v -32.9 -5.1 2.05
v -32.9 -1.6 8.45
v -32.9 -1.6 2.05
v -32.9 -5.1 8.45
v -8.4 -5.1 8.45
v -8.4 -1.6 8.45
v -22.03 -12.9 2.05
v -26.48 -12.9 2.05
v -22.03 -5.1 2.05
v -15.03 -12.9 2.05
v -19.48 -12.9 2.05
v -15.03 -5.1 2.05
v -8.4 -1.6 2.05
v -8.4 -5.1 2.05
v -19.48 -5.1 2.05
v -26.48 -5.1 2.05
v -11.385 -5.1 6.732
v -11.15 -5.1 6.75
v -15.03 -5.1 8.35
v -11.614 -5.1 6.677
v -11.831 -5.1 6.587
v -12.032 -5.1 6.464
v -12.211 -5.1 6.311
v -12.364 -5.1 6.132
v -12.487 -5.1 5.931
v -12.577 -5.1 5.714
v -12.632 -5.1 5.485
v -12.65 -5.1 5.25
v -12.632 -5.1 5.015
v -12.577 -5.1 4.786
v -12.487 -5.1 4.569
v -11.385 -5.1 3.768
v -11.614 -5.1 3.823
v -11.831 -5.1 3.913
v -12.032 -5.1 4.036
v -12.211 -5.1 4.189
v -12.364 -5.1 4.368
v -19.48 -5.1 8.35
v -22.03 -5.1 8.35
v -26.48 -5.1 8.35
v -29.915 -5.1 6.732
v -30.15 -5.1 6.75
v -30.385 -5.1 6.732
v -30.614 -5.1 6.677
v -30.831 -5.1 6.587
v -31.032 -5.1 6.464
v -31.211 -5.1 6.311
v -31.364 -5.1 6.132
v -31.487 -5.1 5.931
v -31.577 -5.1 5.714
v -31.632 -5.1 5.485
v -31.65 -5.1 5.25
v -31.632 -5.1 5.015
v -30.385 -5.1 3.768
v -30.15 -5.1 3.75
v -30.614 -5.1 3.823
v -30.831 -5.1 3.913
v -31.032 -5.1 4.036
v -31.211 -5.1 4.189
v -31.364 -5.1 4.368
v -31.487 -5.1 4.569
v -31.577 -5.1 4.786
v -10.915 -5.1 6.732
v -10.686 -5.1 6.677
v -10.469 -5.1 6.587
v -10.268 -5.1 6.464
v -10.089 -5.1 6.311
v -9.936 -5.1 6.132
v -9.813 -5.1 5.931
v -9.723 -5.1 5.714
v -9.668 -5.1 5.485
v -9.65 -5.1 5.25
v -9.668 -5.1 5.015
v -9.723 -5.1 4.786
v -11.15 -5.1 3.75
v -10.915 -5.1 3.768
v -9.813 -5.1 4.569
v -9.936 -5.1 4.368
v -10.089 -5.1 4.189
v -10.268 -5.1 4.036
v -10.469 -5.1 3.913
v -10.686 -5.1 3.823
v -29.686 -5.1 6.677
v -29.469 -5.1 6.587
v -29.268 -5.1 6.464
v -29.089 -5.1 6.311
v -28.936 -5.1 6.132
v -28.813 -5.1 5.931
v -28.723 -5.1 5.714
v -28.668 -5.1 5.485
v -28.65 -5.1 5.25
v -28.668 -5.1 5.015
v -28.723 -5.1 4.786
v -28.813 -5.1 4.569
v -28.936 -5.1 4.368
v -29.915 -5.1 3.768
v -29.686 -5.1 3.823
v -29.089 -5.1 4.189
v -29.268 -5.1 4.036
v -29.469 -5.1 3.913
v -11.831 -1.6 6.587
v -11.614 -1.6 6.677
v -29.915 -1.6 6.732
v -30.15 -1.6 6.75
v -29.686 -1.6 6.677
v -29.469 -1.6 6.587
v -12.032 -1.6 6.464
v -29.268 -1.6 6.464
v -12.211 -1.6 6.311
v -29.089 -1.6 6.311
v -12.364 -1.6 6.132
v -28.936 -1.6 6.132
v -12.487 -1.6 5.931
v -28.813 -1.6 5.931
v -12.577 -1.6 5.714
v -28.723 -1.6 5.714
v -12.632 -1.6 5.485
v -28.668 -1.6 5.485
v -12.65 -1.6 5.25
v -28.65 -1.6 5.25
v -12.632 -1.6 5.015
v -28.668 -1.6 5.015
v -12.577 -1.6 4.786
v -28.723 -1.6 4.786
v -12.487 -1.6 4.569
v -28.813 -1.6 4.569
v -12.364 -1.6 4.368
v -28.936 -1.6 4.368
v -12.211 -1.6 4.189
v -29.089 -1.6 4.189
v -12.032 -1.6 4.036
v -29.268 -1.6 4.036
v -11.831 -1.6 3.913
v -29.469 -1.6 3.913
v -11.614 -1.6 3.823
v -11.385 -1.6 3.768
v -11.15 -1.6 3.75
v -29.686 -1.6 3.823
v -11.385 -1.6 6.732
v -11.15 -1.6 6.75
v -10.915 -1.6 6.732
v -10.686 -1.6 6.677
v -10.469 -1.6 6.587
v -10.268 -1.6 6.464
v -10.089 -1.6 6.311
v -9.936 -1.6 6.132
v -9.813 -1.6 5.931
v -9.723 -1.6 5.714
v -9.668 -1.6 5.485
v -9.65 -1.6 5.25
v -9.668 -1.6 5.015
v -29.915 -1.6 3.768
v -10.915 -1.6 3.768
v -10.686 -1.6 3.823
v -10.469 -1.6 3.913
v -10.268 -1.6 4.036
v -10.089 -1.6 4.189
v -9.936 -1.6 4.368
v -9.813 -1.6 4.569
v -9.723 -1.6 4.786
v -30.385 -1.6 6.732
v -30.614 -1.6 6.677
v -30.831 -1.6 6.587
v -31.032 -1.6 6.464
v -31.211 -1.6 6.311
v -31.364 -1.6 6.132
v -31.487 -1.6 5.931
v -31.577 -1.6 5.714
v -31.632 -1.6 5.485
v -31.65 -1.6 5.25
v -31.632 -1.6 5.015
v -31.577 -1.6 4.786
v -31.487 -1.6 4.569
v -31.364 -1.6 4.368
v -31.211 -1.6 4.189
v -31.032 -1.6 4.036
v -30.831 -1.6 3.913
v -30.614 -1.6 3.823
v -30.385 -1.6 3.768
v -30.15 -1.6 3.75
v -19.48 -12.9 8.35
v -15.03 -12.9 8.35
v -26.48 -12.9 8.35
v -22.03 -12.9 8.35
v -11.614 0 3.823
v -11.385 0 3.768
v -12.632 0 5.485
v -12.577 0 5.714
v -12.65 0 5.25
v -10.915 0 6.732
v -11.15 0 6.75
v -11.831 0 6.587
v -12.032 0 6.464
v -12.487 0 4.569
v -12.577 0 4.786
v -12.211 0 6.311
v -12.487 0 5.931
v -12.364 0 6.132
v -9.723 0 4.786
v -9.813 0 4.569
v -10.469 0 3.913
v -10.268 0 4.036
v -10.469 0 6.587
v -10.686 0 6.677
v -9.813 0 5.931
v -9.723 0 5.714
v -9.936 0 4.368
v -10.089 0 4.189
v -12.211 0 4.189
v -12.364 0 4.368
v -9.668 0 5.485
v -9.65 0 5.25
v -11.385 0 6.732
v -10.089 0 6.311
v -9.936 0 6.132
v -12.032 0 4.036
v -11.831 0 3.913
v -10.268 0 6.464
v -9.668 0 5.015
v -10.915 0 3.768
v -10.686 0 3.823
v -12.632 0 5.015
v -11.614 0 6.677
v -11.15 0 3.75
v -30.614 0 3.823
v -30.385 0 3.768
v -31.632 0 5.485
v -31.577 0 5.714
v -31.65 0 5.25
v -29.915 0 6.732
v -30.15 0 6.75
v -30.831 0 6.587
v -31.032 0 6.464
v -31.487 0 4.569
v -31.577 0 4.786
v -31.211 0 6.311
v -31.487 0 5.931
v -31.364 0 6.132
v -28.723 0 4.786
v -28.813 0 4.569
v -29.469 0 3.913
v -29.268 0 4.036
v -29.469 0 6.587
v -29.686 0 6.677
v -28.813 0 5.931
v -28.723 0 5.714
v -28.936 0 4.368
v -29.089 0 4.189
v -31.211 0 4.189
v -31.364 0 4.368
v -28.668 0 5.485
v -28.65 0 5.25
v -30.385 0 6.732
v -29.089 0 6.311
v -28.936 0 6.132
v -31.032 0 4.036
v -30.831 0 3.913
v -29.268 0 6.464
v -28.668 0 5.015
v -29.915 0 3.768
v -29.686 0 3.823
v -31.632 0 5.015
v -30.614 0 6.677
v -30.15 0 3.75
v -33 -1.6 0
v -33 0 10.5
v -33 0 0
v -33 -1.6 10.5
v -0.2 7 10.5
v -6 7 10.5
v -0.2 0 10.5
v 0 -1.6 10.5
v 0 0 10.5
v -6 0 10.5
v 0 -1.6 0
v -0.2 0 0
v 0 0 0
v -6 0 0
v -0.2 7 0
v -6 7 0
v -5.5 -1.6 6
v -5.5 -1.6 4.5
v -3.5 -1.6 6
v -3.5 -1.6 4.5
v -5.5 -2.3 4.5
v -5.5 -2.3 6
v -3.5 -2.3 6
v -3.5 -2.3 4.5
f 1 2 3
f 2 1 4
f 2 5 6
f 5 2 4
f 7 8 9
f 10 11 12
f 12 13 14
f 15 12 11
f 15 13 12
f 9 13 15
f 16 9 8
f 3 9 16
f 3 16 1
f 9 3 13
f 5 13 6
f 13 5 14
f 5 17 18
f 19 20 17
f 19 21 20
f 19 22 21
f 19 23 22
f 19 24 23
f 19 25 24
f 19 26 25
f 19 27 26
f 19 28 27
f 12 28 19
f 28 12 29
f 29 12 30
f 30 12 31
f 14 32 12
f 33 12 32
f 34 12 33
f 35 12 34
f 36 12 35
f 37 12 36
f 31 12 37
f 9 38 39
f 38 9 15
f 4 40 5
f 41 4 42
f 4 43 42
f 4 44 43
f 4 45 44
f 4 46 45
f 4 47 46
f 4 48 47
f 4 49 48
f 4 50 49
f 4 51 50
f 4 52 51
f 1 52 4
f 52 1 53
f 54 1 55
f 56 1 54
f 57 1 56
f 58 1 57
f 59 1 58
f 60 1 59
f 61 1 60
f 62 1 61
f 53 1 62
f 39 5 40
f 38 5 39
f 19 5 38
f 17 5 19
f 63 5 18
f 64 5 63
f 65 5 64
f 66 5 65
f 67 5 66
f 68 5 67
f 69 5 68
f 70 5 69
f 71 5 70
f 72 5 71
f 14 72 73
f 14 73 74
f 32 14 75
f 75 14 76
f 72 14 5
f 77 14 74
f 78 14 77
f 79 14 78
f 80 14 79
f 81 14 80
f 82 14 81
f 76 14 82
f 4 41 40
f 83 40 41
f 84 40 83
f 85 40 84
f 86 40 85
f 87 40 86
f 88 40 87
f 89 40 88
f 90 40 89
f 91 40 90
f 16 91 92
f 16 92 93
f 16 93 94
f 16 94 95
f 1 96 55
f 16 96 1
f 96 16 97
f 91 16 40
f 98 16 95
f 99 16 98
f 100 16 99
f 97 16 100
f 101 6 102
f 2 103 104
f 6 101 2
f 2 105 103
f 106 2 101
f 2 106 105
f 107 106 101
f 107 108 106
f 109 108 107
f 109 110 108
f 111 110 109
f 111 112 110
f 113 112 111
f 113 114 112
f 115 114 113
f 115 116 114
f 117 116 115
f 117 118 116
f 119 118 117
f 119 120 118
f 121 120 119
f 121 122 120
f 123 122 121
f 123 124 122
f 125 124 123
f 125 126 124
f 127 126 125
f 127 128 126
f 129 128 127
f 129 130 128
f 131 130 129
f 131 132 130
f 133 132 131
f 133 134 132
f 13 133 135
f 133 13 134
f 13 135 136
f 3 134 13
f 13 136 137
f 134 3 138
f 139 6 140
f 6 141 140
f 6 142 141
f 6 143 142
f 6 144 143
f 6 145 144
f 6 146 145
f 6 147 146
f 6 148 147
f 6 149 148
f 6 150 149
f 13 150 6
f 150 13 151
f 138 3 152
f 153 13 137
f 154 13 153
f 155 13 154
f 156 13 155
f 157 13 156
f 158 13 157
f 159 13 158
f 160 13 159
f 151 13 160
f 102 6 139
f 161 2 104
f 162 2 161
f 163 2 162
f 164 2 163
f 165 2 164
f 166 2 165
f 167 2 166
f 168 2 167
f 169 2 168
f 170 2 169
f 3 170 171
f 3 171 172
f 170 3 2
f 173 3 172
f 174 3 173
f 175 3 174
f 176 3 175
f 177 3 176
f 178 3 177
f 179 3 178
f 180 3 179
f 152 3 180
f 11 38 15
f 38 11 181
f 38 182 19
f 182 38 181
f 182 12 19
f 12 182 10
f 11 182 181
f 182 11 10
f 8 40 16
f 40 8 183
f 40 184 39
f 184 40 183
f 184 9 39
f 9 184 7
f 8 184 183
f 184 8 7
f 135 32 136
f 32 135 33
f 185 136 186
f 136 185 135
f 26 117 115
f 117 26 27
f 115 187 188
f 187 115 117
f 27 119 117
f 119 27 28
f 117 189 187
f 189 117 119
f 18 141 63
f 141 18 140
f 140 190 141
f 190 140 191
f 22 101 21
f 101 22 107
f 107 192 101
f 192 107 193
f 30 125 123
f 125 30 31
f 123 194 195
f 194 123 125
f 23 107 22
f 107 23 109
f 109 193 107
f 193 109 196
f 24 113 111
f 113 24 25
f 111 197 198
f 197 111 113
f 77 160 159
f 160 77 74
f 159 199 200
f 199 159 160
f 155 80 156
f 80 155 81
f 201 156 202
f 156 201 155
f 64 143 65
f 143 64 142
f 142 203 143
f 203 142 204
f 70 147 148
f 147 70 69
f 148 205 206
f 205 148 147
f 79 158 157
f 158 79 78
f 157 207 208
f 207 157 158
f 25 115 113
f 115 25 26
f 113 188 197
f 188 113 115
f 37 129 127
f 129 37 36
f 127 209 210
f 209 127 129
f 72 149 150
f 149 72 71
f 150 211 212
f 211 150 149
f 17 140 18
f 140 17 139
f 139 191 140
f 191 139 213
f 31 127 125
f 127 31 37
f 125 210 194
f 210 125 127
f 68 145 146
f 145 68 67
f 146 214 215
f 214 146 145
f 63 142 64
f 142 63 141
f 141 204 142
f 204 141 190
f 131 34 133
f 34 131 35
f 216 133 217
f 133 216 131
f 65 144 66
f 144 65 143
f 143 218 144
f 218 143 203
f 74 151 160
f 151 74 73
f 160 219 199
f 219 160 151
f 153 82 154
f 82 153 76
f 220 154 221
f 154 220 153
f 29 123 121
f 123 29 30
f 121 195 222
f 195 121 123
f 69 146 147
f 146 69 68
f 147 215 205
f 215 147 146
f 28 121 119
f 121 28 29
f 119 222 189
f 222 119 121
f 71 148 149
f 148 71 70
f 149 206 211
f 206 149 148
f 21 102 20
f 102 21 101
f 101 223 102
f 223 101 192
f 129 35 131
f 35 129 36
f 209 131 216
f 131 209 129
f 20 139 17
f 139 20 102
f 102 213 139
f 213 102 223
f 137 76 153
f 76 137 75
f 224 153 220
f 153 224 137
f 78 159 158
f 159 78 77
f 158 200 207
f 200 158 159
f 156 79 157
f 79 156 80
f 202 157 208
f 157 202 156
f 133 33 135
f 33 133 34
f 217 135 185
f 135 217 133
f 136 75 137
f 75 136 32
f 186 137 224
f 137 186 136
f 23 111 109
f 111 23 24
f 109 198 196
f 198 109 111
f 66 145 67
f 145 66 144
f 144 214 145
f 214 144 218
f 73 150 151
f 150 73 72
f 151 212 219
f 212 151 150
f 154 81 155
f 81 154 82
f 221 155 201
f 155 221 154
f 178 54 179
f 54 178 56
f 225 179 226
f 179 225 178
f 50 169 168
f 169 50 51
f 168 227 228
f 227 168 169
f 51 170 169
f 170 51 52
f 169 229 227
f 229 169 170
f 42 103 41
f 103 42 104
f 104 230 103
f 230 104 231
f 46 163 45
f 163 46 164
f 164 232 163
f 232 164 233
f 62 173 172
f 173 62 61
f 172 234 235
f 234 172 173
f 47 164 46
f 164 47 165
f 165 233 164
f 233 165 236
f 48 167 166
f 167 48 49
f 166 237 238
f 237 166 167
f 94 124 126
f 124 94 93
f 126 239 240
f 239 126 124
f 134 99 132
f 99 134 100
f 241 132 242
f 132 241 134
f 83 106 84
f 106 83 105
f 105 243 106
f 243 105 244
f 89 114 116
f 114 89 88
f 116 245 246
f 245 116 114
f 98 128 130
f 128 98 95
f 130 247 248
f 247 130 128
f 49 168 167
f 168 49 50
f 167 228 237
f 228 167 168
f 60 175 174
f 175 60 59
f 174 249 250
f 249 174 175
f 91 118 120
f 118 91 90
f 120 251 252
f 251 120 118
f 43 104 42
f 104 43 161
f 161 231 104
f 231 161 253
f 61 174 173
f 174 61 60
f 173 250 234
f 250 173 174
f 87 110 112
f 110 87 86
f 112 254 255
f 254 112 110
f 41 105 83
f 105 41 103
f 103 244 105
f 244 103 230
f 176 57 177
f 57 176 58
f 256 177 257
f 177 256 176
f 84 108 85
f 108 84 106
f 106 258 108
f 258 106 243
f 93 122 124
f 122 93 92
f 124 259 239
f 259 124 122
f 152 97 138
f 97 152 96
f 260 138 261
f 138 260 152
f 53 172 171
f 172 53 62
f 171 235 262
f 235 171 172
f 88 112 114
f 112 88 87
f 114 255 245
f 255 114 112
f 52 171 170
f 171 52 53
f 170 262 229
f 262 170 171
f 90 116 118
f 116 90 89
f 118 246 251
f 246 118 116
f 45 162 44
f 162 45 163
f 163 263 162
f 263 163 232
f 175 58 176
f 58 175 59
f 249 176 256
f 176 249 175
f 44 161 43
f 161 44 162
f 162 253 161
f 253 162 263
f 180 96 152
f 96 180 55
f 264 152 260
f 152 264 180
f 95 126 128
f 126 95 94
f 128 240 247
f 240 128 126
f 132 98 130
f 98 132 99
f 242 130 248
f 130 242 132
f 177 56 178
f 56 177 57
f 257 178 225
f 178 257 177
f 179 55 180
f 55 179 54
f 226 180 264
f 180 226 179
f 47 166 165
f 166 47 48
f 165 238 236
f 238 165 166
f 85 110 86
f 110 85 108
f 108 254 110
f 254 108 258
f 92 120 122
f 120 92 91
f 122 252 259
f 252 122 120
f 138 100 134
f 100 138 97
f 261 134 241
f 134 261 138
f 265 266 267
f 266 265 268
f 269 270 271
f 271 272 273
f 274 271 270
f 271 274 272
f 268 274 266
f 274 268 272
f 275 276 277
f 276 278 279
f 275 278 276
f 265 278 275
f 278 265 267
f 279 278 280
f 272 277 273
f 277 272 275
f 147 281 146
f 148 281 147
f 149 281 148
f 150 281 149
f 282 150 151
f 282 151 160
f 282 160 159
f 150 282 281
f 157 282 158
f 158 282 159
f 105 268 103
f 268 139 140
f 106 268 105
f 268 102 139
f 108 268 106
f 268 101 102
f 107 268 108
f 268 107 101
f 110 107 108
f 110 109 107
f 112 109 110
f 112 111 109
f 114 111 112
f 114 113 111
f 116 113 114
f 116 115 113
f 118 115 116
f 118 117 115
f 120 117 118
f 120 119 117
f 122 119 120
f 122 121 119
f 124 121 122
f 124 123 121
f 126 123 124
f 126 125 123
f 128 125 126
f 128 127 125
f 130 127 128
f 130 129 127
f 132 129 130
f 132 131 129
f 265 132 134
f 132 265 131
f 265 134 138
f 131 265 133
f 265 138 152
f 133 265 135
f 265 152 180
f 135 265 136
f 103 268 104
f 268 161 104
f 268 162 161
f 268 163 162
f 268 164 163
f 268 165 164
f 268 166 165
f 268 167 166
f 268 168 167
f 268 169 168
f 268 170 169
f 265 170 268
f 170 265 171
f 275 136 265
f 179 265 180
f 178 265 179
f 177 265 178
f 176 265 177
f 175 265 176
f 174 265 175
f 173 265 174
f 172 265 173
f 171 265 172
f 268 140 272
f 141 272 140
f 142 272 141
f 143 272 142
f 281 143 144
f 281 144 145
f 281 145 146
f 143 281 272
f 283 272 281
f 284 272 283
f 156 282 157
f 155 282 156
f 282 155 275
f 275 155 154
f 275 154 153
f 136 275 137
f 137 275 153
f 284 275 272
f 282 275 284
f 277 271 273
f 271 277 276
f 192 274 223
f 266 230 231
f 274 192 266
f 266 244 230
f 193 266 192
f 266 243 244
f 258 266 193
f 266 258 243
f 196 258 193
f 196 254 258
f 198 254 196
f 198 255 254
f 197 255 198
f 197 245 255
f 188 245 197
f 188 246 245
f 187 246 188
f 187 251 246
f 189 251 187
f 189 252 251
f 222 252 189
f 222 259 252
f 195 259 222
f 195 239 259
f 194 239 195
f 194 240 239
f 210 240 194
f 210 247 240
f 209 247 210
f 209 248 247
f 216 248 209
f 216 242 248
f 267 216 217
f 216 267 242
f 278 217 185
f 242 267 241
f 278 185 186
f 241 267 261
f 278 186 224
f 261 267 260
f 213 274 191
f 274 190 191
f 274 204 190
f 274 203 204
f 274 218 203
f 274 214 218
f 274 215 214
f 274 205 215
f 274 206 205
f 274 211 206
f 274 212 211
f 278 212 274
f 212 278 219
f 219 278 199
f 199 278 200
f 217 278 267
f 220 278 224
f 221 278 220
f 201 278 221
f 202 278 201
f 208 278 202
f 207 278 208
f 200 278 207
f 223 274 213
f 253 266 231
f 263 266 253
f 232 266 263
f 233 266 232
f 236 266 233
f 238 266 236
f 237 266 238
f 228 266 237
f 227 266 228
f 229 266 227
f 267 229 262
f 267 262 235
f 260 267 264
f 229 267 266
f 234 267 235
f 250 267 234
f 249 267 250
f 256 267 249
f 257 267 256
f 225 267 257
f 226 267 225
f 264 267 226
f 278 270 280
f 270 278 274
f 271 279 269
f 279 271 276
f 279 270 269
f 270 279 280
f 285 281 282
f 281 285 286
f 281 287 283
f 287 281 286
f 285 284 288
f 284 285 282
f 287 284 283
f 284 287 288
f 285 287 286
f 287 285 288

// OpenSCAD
// Source: http://www.thingiverse.com/thing:295765

module opto_endstop()
{
  difference() {
    union() {
      // base PCB
      color("red") cube([33.0, 1.6, 10.5]);
      // add the switch module
      translate([8.4, 1.6, 10.5/2-6.4/2]) opto_switch();
      // connector
      translate([0.2, -7, 0]) color("white") cube([5.8, 7, 10.5]);
      // led
      translate([3.5, 1.6, 10.5/2-1.5/2]) color("white") cube([2, 0.7, 1.5]);
    }
    translate([8.4, 0, 10.5/2-6.4/2]) {
      for (hole=[2.75, 24.5-2.75]) {
        rotate([90,0,0]) translate([hole, 6.4/2, -4]) cylinder(r=1.5, h=4.5, $fn=40);
      }
    }
  }
}

// switch module
module opto_switch()
{
  difference(){
    union() color("gray") {
      cube([24.5, 3.5, 6.4]);
      translate([6.63, 0, 0]) cube([4.45, 11.3, 6.3]);
      translate([13.63, 0, 0]) cube([4.45, 11.3, 6.3]);
    }
    for (hole=[2.75,24.5-2.75] ){
      rotate([90, 0, 0]) translate([hole, 6.4/2, -4]) cylinder(r=1.5, h=4.5, $fn=40);
    }
  }
}

rotate ([0,0,180]) opto_endstop();
